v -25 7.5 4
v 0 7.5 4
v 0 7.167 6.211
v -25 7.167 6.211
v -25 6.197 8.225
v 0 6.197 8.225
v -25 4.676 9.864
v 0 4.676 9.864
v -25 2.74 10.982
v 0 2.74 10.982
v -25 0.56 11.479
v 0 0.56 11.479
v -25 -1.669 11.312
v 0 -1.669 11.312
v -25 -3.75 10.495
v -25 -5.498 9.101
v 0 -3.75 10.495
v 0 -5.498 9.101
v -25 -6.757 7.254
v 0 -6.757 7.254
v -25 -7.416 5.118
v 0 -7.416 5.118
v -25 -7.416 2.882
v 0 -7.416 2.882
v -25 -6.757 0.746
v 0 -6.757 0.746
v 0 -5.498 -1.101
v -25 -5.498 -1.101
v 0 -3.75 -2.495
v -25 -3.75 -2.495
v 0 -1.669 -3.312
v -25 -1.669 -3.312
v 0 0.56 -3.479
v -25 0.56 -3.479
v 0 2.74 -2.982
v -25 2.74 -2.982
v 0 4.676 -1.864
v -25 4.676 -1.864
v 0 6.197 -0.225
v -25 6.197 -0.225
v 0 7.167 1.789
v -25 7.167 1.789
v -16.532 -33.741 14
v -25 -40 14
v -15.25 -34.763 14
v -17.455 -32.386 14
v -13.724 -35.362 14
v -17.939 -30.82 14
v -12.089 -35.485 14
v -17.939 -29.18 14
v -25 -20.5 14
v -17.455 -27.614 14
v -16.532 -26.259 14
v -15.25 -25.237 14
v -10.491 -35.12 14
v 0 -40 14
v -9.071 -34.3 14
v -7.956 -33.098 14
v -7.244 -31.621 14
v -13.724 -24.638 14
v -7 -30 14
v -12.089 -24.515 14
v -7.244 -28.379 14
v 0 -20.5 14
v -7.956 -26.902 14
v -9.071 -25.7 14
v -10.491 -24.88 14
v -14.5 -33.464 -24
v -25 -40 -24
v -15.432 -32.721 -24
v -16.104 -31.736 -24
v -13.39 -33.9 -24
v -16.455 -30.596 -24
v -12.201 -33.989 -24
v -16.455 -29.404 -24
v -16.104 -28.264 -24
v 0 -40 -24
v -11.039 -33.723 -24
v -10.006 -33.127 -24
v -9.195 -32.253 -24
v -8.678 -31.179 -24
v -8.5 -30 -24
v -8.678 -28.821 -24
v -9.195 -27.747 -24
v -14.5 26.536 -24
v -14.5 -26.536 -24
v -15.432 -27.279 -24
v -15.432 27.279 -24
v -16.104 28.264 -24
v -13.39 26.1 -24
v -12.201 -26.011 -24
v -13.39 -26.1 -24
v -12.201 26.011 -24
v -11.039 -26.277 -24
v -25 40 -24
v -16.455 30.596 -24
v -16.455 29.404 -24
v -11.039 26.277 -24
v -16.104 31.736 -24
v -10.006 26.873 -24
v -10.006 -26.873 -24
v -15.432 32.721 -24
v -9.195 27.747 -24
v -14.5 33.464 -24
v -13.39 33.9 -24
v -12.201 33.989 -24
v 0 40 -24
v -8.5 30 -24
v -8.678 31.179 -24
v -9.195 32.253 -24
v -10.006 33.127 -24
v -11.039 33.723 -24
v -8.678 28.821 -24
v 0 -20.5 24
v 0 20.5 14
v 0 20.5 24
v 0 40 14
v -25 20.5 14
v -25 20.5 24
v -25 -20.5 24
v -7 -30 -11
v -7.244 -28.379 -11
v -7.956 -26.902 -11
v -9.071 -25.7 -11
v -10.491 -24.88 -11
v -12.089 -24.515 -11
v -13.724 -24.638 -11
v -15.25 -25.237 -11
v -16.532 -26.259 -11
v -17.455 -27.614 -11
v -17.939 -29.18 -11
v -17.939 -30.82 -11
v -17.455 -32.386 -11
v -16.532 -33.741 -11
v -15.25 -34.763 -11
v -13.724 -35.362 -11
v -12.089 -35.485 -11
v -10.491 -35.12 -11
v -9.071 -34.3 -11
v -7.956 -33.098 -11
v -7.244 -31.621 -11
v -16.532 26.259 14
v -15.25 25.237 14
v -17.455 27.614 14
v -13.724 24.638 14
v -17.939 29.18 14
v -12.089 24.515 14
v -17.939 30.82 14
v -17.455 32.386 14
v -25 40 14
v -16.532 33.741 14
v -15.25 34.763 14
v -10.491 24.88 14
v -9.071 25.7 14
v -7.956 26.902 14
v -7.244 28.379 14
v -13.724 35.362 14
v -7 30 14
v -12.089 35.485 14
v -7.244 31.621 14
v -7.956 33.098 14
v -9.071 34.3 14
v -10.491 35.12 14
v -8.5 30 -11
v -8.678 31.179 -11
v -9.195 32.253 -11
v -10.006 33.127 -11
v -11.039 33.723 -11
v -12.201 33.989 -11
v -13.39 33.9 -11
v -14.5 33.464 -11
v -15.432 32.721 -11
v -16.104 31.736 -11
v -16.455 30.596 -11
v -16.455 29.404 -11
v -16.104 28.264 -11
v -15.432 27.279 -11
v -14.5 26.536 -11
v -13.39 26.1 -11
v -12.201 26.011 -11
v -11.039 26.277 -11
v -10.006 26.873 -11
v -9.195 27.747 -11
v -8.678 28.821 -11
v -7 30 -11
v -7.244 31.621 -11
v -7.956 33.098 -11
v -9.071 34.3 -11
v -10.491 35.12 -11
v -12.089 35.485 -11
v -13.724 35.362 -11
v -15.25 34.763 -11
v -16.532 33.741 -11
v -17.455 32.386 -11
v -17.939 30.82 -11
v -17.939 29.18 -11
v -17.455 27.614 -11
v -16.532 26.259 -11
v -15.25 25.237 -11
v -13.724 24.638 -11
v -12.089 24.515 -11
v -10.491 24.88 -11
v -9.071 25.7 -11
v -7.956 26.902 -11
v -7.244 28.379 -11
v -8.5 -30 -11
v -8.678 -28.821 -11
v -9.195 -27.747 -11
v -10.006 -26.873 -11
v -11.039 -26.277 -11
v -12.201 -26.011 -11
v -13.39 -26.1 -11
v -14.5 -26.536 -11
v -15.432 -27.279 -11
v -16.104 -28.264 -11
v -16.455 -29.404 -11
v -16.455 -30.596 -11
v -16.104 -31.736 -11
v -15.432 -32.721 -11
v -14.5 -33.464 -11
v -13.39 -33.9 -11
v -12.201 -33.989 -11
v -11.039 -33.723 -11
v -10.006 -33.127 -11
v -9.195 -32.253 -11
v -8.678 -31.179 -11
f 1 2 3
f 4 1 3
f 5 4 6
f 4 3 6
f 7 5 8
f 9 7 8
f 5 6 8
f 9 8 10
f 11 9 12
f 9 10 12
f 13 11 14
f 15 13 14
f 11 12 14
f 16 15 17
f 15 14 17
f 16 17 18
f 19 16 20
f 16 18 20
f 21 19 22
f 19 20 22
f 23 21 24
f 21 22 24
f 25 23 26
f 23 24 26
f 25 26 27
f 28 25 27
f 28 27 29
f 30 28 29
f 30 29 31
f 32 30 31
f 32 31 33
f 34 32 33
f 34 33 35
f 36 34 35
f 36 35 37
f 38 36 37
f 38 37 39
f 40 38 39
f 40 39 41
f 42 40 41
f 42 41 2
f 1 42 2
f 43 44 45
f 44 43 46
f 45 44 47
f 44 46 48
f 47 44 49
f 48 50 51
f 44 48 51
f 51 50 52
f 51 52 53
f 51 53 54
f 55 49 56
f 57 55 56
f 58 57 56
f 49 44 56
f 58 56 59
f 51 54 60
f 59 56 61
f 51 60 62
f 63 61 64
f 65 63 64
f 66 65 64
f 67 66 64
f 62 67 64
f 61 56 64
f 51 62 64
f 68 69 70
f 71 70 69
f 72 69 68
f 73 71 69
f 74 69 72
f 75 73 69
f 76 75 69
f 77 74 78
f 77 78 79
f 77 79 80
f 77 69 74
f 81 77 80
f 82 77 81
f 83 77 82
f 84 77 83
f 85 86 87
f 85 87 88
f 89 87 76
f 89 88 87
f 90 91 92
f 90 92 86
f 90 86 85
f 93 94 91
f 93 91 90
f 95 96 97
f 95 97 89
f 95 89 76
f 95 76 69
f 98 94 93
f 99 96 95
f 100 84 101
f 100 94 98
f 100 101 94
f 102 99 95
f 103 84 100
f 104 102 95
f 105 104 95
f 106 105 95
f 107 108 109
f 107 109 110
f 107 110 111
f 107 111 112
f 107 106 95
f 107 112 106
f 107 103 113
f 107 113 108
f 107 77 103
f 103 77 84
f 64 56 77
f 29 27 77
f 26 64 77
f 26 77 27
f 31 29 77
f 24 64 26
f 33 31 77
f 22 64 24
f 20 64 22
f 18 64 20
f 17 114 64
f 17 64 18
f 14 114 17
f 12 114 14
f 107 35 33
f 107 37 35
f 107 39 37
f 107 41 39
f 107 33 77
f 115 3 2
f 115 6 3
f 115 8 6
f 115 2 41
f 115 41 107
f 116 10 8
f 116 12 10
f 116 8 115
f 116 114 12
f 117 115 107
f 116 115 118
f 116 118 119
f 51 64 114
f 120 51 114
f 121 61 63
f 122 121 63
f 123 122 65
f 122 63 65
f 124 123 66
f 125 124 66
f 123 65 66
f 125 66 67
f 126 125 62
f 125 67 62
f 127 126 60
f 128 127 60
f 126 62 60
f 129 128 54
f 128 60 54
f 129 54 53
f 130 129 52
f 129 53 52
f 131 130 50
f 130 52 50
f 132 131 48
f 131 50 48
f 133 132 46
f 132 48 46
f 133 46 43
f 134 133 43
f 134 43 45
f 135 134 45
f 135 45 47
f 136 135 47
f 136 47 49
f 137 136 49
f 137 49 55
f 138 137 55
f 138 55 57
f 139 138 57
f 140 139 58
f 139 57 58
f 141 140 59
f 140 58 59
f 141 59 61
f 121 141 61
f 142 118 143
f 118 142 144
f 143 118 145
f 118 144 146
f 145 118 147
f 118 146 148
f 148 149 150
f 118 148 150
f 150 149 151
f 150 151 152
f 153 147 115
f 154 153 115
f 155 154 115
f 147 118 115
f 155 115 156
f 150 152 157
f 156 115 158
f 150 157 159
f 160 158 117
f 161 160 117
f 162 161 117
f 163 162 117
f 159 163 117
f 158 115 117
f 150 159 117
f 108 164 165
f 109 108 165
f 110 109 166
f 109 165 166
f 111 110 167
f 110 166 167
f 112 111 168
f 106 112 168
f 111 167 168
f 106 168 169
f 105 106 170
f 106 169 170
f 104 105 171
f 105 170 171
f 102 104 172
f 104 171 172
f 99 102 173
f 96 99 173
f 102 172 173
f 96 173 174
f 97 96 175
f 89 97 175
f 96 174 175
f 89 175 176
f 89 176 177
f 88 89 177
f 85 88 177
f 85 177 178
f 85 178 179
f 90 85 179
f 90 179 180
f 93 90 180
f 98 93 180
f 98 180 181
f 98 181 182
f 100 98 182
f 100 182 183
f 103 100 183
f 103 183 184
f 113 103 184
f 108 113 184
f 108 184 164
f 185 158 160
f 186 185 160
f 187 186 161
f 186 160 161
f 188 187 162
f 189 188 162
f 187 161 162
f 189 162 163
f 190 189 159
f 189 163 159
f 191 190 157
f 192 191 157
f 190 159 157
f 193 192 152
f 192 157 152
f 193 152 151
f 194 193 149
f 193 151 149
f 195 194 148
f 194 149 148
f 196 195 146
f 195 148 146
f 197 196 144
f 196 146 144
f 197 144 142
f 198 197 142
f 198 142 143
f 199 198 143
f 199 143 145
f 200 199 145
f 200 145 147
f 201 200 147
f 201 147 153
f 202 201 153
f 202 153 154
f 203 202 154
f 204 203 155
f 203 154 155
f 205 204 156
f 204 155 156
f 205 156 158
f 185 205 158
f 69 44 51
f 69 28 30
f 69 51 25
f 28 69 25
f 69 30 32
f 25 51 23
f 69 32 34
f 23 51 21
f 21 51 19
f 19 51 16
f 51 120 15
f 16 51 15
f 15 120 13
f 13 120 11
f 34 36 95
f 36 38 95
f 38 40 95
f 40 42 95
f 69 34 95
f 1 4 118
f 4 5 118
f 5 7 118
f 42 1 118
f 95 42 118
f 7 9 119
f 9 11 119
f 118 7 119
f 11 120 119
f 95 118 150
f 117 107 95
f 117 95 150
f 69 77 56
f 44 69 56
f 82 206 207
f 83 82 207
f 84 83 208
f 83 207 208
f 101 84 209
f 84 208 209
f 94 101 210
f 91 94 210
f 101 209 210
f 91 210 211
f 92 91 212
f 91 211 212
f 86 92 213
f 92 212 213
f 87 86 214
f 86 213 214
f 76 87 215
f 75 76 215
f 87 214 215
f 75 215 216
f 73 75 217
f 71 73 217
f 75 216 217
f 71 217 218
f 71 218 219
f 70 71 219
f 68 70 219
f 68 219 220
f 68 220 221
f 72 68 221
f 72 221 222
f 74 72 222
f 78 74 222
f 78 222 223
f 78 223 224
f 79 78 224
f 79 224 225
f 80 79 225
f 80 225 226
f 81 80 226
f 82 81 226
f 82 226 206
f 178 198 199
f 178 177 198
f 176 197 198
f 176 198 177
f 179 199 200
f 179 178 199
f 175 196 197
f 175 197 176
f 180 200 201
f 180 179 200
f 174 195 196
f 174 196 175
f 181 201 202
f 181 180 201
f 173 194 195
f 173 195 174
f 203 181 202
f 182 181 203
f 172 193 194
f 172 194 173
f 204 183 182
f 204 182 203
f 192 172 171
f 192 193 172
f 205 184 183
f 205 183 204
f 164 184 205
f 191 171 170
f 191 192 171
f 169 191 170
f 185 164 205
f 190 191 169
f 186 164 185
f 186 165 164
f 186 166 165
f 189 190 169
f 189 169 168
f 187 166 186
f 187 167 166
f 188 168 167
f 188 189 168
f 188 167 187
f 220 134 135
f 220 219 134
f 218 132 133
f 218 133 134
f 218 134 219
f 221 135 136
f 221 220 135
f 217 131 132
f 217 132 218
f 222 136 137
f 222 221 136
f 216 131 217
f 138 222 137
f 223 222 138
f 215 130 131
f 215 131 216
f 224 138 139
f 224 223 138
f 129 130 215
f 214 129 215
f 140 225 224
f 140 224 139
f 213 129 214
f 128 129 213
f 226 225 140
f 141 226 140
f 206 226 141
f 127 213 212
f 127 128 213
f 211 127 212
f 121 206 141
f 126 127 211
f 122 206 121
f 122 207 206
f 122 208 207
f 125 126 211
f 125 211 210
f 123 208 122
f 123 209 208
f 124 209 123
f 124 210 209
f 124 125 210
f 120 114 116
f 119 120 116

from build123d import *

# Parameters (mm, degrees)
F0_W     = 80
F0_H     = 48
F1_DEPTH = 25
F2_W     = 19.5
F2_H     = 10
F3_DEPTH = 25.001
F4_R     = 7.5
F5_DEPTH = 25.001
F6_R     = 5.5
F6_R_2   = 4
F7_DEPTH = 25
F8_DEPTH = 38.001


with BuildPart() as f1:
    # F0 (on Right) → F1 (new body)
    with BuildSketch(Plane.YZ):
        Rectangle(F0_W, F0_H)
    extrude(amount=-F1_DEPTH)

    # F2 (on face) → F3 (cut, through all)
    with BuildSketch(Plane.YZ):
        with Locations((-30.25, 19)):
            Rectangle(F2_W, F2_H)
        with Locations((30.25, 19)):
            Rectangle(F2_W, F2_H)
    extrude(amount=-F3_DEPTH, mode=Mode.SUBTRACT)

    # F4 (on face) → F5 (cut, through all)
    with BuildSketch(Plane.YZ):
        with Locations((0, 4)):
            Circle(F4_R)
    extrude(amount=-F5_DEPTH, mode=Mode.SUBTRACT)

    # F6 (on face) → F7 (cut)
    with BuildSketch(Plane.XY.offset(14)):
        with Locations((-12.5, 30)):
            Circle(F6_R)
        with Locations((-12.5, 30)):
            Circle(F6_R_2, mode=Mode.SUBTRACT)
        with Locations((-12.5, -30)):
            Circle(F6_R)
        with Locations((-12.5, -30)):
            Circle(F6_R_2, mode=Mode.SUBTRACT)
    extrude(amount=-F7_DEPTH, mode=Mode.SUBTRACT)

    # F8 (cut, through all): faces of the model
    f8_faces = [f1.faces().sort_by_distance(p)[0] for p in [
        (-12.5, 30, 14),
        (-12.5, -30, 14),
    ]]
    extrude(f8_faces, amount=-F8_DEPTH, mode=Mode.SUBTRACT)


solid = f1.part
